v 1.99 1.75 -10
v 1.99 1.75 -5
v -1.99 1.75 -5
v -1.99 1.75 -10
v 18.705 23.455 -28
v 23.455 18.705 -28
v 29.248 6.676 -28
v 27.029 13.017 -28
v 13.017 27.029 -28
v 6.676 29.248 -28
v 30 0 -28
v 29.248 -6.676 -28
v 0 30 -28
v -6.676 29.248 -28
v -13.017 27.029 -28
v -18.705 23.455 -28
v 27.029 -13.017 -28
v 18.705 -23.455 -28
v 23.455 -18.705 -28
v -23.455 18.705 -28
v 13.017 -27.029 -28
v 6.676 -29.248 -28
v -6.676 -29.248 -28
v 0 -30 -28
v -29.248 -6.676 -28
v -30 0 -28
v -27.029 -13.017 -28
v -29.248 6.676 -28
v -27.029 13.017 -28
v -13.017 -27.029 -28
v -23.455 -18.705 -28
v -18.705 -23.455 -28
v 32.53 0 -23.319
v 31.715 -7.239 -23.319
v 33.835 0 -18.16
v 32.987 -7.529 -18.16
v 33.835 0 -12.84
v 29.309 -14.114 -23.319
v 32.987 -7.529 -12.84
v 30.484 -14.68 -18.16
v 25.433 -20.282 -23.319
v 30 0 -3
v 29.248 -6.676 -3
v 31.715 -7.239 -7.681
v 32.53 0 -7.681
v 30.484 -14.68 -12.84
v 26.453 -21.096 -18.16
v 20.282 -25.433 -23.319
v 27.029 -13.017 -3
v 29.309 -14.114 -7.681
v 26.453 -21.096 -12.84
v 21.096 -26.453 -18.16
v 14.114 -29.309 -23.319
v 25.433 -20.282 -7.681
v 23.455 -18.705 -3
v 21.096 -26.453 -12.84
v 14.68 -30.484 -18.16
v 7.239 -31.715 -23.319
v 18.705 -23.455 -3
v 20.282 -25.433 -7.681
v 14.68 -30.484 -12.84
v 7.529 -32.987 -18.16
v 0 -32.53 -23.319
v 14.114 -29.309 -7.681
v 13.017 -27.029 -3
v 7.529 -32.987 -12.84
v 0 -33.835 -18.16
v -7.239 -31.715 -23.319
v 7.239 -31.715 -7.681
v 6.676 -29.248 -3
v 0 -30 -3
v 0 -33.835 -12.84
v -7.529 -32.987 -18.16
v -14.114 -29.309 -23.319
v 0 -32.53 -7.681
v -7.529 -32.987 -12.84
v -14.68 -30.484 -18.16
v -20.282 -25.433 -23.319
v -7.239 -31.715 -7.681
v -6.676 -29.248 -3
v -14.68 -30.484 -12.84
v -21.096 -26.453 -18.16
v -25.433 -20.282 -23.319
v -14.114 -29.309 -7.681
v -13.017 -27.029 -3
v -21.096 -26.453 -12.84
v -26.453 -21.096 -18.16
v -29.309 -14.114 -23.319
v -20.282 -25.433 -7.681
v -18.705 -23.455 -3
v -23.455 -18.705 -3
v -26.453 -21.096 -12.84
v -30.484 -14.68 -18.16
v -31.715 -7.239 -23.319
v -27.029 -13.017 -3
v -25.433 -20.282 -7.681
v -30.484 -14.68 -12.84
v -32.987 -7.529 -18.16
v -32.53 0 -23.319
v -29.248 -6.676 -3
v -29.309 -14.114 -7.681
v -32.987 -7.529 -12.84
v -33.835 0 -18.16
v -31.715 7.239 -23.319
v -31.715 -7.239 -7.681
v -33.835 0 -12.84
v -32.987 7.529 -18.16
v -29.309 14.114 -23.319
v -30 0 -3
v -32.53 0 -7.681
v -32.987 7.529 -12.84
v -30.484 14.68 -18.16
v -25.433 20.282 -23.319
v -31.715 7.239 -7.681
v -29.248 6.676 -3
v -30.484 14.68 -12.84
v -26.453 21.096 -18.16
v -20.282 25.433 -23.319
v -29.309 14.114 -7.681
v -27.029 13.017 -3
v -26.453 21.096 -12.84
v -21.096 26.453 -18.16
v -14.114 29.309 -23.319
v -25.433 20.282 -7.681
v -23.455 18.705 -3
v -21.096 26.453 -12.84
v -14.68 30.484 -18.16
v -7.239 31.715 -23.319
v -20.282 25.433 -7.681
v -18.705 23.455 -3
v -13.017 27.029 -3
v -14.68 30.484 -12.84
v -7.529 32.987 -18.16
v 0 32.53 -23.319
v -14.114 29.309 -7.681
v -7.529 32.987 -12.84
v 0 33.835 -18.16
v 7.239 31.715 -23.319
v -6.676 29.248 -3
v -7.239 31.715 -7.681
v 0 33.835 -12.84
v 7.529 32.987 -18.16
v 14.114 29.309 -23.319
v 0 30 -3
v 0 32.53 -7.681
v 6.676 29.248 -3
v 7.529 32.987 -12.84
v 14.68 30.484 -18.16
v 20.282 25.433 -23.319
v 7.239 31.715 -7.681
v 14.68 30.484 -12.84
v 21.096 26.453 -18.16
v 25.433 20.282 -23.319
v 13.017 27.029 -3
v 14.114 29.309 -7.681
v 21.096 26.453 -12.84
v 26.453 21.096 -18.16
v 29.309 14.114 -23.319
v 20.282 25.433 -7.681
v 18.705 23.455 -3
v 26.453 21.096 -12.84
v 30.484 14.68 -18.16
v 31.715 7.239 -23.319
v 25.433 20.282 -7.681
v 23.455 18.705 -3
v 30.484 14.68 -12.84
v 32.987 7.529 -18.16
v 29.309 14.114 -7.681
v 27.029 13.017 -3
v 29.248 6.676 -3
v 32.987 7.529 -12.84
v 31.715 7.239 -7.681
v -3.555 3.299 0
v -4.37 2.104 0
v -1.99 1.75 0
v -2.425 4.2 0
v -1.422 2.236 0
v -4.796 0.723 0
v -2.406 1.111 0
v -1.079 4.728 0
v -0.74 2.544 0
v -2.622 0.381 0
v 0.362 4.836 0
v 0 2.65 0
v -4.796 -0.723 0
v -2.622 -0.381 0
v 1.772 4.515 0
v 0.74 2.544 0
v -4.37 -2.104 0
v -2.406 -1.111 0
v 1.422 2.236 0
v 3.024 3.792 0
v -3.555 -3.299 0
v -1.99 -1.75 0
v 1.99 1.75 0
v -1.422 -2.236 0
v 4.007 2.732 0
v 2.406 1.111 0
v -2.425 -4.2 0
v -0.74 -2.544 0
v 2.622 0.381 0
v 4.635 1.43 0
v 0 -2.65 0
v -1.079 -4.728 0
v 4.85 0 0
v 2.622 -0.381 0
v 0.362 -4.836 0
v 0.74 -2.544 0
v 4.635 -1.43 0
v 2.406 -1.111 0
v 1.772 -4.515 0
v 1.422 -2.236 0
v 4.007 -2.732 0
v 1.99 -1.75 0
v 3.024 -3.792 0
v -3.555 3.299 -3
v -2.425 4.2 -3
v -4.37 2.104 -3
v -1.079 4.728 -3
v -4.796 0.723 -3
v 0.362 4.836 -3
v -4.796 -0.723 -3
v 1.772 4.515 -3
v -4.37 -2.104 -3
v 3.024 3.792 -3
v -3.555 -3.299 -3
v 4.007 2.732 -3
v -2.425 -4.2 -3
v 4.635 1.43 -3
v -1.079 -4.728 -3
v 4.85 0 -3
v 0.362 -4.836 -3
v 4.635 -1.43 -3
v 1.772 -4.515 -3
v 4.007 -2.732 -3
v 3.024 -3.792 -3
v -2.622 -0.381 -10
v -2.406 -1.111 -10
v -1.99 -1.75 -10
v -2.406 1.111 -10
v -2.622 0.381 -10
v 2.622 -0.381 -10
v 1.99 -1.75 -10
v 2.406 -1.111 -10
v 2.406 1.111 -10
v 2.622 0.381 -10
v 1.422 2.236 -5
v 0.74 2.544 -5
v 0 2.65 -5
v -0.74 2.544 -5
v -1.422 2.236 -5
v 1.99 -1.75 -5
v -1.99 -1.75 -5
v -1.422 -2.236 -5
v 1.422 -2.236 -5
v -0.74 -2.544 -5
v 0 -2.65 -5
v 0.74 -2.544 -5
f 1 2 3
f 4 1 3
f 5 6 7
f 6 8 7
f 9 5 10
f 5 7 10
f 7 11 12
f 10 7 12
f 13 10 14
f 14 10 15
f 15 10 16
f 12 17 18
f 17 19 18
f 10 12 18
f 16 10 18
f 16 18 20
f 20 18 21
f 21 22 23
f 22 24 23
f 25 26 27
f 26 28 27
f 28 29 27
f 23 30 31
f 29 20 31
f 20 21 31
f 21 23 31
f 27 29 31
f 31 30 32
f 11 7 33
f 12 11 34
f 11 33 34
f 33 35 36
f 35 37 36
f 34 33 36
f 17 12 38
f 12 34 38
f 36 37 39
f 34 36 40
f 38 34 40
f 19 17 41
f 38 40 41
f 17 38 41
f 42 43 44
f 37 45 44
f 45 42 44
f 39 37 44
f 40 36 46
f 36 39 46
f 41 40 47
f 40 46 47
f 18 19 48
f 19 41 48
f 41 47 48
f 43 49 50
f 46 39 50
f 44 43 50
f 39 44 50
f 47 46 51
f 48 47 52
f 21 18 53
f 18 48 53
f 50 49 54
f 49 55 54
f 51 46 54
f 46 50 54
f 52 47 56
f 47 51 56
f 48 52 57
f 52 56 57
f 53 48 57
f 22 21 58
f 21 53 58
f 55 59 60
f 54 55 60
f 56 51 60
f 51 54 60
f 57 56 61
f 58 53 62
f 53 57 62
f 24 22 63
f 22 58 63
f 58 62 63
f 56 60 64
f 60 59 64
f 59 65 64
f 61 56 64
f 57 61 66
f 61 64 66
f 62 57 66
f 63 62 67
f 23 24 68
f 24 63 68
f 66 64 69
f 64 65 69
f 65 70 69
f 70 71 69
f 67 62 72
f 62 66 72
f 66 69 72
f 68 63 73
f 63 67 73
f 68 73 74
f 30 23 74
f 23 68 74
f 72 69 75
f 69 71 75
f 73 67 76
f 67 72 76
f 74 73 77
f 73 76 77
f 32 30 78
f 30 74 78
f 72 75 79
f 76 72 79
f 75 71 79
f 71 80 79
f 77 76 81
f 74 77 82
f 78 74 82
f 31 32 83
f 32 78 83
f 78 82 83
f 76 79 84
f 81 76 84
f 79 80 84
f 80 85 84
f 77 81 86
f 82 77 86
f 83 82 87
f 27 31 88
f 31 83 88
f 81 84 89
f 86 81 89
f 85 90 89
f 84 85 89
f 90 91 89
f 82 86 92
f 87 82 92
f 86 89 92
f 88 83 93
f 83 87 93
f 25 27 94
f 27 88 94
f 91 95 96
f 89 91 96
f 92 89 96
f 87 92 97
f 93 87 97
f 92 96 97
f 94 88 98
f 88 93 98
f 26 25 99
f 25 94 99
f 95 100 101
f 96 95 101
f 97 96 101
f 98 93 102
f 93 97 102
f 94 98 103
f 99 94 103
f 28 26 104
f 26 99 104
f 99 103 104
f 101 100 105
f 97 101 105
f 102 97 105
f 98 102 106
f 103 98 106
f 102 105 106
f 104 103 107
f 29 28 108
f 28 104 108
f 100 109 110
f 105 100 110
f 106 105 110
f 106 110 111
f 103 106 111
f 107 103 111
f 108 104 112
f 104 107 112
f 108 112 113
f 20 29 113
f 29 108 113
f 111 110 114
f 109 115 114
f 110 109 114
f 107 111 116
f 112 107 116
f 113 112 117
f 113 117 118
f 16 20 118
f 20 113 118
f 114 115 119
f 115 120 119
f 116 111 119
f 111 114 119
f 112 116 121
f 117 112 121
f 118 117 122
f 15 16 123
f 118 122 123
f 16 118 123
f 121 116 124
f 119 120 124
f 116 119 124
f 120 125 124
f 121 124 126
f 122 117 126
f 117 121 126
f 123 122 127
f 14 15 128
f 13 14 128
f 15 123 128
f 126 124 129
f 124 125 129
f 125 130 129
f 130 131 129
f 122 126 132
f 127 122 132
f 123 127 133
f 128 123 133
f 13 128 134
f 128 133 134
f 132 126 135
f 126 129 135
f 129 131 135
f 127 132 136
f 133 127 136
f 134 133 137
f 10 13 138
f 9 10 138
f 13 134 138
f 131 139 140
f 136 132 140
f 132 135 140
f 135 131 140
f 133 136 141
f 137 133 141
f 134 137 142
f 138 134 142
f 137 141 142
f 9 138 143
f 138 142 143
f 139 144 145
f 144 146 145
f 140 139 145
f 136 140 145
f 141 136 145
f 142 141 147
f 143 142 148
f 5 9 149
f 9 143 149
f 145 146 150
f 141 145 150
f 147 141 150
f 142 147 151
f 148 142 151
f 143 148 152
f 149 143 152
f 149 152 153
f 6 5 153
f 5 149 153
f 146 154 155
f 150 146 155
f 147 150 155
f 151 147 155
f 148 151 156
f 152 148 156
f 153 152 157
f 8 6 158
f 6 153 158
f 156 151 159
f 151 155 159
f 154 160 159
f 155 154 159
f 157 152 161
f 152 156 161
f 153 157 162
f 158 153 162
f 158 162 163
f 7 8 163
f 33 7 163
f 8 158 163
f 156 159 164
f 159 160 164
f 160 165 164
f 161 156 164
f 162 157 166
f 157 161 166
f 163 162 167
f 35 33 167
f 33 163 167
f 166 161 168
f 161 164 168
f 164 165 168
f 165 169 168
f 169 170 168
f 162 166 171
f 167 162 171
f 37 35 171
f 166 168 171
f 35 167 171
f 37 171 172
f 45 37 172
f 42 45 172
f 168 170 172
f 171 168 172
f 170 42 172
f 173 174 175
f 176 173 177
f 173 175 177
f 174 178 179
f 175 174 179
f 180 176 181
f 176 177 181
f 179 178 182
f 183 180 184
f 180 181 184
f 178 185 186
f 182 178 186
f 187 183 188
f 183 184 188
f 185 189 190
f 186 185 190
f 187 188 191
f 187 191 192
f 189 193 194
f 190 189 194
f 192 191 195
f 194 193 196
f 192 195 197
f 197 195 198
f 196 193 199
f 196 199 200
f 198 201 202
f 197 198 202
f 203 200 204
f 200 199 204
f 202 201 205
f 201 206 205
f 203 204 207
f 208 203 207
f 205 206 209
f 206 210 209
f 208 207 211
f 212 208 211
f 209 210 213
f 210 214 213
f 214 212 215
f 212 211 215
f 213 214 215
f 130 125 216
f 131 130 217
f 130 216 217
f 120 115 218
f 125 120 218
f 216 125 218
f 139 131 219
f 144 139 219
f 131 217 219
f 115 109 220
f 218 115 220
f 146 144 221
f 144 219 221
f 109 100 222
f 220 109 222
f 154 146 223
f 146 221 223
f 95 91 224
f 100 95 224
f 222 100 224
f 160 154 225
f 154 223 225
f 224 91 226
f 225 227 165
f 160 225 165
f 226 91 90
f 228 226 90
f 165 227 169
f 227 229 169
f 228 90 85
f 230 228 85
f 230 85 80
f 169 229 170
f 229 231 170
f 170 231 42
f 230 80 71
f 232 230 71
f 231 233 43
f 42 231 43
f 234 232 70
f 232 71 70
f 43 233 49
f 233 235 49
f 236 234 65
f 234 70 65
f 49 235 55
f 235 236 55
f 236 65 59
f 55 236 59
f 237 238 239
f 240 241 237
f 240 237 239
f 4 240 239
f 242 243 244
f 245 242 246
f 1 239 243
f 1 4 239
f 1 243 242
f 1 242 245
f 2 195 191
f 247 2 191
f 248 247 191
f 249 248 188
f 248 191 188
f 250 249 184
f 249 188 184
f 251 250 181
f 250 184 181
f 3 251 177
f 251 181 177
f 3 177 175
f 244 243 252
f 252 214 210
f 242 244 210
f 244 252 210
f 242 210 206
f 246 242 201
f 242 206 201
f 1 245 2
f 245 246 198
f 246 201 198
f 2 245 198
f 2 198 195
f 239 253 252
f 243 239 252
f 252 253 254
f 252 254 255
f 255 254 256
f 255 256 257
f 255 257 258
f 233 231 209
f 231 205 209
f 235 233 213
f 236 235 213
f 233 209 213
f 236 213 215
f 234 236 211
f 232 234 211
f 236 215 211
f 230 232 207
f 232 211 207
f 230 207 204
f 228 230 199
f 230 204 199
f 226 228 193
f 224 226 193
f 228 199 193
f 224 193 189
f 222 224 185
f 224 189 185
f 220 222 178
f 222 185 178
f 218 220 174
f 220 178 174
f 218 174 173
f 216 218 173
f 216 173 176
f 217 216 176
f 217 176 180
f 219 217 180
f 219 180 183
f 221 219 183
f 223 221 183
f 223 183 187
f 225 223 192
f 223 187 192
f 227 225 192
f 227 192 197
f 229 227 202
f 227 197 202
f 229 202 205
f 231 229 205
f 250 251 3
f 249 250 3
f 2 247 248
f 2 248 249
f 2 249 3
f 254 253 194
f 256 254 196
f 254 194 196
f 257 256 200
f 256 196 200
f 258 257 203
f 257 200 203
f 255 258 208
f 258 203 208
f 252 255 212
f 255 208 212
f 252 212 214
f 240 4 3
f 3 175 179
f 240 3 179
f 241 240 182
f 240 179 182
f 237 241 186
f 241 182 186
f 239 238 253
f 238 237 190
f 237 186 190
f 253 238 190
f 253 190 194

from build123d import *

# Parameters (mm, degrees)
CUT_EXTRUDE_1_DEPTH = 10
SKETCH_4_R          = 2.65
CUT_EXTRUDE_2_DEPTH = 5


with BuildPart() as part:
    # 草图2 → 旋转1 (revolve)
    with BuildSketch(Plane(origin=(0, 0, 0), x_dir=(1, 0, 0), z_dir=(0, 1, 0))):
        with BuildLine():
            Line((0, 0), (0, 28))
            Line((0, 28), (30, 28))
            ThreePointArc((30, 28), (34, 15.5), (30, 3))
            Line((30, 3), (4.85, 3))
            Line((4.85, 3), (4.85, 0))
            Line((4.85, 0), (0, 0))
        make_face()
    revolve(axis=Axis((0, 0, 0), (0, 0, -1)))

    # 草图3 → 切除-拉伸1 (cut)
    with BuildSketch(Plane.XY):
        with BuildLine():
            Line((1.989974874, 1.75), (-1.989974874, 1.75))
            ThreePointArc((-1.989974874, 1.75), (-2.65, 0), (-1.989974874, -1.75))
            Line((-1.989974874, -1.75), (1.989974874, -1.75))
            ThreePointArc((1.989974874, -1.75), (2.65, 0), (1.989974874, 1.75))
        make_face()
    extrude(amount=-CUT_EXTRUDE_1_DEPTH, mode=Mode.SUBTRACT)

    # 草图4 → 切除-拉伸2 (cut)
    with BuildSketch(Plane.XY):
        Circle(SKETCH_4_R)
    extrude(amount=-CUT_EXTRUDE_2_DEPTH, mode=Mode.SUBTRACT)


solid = part.part
